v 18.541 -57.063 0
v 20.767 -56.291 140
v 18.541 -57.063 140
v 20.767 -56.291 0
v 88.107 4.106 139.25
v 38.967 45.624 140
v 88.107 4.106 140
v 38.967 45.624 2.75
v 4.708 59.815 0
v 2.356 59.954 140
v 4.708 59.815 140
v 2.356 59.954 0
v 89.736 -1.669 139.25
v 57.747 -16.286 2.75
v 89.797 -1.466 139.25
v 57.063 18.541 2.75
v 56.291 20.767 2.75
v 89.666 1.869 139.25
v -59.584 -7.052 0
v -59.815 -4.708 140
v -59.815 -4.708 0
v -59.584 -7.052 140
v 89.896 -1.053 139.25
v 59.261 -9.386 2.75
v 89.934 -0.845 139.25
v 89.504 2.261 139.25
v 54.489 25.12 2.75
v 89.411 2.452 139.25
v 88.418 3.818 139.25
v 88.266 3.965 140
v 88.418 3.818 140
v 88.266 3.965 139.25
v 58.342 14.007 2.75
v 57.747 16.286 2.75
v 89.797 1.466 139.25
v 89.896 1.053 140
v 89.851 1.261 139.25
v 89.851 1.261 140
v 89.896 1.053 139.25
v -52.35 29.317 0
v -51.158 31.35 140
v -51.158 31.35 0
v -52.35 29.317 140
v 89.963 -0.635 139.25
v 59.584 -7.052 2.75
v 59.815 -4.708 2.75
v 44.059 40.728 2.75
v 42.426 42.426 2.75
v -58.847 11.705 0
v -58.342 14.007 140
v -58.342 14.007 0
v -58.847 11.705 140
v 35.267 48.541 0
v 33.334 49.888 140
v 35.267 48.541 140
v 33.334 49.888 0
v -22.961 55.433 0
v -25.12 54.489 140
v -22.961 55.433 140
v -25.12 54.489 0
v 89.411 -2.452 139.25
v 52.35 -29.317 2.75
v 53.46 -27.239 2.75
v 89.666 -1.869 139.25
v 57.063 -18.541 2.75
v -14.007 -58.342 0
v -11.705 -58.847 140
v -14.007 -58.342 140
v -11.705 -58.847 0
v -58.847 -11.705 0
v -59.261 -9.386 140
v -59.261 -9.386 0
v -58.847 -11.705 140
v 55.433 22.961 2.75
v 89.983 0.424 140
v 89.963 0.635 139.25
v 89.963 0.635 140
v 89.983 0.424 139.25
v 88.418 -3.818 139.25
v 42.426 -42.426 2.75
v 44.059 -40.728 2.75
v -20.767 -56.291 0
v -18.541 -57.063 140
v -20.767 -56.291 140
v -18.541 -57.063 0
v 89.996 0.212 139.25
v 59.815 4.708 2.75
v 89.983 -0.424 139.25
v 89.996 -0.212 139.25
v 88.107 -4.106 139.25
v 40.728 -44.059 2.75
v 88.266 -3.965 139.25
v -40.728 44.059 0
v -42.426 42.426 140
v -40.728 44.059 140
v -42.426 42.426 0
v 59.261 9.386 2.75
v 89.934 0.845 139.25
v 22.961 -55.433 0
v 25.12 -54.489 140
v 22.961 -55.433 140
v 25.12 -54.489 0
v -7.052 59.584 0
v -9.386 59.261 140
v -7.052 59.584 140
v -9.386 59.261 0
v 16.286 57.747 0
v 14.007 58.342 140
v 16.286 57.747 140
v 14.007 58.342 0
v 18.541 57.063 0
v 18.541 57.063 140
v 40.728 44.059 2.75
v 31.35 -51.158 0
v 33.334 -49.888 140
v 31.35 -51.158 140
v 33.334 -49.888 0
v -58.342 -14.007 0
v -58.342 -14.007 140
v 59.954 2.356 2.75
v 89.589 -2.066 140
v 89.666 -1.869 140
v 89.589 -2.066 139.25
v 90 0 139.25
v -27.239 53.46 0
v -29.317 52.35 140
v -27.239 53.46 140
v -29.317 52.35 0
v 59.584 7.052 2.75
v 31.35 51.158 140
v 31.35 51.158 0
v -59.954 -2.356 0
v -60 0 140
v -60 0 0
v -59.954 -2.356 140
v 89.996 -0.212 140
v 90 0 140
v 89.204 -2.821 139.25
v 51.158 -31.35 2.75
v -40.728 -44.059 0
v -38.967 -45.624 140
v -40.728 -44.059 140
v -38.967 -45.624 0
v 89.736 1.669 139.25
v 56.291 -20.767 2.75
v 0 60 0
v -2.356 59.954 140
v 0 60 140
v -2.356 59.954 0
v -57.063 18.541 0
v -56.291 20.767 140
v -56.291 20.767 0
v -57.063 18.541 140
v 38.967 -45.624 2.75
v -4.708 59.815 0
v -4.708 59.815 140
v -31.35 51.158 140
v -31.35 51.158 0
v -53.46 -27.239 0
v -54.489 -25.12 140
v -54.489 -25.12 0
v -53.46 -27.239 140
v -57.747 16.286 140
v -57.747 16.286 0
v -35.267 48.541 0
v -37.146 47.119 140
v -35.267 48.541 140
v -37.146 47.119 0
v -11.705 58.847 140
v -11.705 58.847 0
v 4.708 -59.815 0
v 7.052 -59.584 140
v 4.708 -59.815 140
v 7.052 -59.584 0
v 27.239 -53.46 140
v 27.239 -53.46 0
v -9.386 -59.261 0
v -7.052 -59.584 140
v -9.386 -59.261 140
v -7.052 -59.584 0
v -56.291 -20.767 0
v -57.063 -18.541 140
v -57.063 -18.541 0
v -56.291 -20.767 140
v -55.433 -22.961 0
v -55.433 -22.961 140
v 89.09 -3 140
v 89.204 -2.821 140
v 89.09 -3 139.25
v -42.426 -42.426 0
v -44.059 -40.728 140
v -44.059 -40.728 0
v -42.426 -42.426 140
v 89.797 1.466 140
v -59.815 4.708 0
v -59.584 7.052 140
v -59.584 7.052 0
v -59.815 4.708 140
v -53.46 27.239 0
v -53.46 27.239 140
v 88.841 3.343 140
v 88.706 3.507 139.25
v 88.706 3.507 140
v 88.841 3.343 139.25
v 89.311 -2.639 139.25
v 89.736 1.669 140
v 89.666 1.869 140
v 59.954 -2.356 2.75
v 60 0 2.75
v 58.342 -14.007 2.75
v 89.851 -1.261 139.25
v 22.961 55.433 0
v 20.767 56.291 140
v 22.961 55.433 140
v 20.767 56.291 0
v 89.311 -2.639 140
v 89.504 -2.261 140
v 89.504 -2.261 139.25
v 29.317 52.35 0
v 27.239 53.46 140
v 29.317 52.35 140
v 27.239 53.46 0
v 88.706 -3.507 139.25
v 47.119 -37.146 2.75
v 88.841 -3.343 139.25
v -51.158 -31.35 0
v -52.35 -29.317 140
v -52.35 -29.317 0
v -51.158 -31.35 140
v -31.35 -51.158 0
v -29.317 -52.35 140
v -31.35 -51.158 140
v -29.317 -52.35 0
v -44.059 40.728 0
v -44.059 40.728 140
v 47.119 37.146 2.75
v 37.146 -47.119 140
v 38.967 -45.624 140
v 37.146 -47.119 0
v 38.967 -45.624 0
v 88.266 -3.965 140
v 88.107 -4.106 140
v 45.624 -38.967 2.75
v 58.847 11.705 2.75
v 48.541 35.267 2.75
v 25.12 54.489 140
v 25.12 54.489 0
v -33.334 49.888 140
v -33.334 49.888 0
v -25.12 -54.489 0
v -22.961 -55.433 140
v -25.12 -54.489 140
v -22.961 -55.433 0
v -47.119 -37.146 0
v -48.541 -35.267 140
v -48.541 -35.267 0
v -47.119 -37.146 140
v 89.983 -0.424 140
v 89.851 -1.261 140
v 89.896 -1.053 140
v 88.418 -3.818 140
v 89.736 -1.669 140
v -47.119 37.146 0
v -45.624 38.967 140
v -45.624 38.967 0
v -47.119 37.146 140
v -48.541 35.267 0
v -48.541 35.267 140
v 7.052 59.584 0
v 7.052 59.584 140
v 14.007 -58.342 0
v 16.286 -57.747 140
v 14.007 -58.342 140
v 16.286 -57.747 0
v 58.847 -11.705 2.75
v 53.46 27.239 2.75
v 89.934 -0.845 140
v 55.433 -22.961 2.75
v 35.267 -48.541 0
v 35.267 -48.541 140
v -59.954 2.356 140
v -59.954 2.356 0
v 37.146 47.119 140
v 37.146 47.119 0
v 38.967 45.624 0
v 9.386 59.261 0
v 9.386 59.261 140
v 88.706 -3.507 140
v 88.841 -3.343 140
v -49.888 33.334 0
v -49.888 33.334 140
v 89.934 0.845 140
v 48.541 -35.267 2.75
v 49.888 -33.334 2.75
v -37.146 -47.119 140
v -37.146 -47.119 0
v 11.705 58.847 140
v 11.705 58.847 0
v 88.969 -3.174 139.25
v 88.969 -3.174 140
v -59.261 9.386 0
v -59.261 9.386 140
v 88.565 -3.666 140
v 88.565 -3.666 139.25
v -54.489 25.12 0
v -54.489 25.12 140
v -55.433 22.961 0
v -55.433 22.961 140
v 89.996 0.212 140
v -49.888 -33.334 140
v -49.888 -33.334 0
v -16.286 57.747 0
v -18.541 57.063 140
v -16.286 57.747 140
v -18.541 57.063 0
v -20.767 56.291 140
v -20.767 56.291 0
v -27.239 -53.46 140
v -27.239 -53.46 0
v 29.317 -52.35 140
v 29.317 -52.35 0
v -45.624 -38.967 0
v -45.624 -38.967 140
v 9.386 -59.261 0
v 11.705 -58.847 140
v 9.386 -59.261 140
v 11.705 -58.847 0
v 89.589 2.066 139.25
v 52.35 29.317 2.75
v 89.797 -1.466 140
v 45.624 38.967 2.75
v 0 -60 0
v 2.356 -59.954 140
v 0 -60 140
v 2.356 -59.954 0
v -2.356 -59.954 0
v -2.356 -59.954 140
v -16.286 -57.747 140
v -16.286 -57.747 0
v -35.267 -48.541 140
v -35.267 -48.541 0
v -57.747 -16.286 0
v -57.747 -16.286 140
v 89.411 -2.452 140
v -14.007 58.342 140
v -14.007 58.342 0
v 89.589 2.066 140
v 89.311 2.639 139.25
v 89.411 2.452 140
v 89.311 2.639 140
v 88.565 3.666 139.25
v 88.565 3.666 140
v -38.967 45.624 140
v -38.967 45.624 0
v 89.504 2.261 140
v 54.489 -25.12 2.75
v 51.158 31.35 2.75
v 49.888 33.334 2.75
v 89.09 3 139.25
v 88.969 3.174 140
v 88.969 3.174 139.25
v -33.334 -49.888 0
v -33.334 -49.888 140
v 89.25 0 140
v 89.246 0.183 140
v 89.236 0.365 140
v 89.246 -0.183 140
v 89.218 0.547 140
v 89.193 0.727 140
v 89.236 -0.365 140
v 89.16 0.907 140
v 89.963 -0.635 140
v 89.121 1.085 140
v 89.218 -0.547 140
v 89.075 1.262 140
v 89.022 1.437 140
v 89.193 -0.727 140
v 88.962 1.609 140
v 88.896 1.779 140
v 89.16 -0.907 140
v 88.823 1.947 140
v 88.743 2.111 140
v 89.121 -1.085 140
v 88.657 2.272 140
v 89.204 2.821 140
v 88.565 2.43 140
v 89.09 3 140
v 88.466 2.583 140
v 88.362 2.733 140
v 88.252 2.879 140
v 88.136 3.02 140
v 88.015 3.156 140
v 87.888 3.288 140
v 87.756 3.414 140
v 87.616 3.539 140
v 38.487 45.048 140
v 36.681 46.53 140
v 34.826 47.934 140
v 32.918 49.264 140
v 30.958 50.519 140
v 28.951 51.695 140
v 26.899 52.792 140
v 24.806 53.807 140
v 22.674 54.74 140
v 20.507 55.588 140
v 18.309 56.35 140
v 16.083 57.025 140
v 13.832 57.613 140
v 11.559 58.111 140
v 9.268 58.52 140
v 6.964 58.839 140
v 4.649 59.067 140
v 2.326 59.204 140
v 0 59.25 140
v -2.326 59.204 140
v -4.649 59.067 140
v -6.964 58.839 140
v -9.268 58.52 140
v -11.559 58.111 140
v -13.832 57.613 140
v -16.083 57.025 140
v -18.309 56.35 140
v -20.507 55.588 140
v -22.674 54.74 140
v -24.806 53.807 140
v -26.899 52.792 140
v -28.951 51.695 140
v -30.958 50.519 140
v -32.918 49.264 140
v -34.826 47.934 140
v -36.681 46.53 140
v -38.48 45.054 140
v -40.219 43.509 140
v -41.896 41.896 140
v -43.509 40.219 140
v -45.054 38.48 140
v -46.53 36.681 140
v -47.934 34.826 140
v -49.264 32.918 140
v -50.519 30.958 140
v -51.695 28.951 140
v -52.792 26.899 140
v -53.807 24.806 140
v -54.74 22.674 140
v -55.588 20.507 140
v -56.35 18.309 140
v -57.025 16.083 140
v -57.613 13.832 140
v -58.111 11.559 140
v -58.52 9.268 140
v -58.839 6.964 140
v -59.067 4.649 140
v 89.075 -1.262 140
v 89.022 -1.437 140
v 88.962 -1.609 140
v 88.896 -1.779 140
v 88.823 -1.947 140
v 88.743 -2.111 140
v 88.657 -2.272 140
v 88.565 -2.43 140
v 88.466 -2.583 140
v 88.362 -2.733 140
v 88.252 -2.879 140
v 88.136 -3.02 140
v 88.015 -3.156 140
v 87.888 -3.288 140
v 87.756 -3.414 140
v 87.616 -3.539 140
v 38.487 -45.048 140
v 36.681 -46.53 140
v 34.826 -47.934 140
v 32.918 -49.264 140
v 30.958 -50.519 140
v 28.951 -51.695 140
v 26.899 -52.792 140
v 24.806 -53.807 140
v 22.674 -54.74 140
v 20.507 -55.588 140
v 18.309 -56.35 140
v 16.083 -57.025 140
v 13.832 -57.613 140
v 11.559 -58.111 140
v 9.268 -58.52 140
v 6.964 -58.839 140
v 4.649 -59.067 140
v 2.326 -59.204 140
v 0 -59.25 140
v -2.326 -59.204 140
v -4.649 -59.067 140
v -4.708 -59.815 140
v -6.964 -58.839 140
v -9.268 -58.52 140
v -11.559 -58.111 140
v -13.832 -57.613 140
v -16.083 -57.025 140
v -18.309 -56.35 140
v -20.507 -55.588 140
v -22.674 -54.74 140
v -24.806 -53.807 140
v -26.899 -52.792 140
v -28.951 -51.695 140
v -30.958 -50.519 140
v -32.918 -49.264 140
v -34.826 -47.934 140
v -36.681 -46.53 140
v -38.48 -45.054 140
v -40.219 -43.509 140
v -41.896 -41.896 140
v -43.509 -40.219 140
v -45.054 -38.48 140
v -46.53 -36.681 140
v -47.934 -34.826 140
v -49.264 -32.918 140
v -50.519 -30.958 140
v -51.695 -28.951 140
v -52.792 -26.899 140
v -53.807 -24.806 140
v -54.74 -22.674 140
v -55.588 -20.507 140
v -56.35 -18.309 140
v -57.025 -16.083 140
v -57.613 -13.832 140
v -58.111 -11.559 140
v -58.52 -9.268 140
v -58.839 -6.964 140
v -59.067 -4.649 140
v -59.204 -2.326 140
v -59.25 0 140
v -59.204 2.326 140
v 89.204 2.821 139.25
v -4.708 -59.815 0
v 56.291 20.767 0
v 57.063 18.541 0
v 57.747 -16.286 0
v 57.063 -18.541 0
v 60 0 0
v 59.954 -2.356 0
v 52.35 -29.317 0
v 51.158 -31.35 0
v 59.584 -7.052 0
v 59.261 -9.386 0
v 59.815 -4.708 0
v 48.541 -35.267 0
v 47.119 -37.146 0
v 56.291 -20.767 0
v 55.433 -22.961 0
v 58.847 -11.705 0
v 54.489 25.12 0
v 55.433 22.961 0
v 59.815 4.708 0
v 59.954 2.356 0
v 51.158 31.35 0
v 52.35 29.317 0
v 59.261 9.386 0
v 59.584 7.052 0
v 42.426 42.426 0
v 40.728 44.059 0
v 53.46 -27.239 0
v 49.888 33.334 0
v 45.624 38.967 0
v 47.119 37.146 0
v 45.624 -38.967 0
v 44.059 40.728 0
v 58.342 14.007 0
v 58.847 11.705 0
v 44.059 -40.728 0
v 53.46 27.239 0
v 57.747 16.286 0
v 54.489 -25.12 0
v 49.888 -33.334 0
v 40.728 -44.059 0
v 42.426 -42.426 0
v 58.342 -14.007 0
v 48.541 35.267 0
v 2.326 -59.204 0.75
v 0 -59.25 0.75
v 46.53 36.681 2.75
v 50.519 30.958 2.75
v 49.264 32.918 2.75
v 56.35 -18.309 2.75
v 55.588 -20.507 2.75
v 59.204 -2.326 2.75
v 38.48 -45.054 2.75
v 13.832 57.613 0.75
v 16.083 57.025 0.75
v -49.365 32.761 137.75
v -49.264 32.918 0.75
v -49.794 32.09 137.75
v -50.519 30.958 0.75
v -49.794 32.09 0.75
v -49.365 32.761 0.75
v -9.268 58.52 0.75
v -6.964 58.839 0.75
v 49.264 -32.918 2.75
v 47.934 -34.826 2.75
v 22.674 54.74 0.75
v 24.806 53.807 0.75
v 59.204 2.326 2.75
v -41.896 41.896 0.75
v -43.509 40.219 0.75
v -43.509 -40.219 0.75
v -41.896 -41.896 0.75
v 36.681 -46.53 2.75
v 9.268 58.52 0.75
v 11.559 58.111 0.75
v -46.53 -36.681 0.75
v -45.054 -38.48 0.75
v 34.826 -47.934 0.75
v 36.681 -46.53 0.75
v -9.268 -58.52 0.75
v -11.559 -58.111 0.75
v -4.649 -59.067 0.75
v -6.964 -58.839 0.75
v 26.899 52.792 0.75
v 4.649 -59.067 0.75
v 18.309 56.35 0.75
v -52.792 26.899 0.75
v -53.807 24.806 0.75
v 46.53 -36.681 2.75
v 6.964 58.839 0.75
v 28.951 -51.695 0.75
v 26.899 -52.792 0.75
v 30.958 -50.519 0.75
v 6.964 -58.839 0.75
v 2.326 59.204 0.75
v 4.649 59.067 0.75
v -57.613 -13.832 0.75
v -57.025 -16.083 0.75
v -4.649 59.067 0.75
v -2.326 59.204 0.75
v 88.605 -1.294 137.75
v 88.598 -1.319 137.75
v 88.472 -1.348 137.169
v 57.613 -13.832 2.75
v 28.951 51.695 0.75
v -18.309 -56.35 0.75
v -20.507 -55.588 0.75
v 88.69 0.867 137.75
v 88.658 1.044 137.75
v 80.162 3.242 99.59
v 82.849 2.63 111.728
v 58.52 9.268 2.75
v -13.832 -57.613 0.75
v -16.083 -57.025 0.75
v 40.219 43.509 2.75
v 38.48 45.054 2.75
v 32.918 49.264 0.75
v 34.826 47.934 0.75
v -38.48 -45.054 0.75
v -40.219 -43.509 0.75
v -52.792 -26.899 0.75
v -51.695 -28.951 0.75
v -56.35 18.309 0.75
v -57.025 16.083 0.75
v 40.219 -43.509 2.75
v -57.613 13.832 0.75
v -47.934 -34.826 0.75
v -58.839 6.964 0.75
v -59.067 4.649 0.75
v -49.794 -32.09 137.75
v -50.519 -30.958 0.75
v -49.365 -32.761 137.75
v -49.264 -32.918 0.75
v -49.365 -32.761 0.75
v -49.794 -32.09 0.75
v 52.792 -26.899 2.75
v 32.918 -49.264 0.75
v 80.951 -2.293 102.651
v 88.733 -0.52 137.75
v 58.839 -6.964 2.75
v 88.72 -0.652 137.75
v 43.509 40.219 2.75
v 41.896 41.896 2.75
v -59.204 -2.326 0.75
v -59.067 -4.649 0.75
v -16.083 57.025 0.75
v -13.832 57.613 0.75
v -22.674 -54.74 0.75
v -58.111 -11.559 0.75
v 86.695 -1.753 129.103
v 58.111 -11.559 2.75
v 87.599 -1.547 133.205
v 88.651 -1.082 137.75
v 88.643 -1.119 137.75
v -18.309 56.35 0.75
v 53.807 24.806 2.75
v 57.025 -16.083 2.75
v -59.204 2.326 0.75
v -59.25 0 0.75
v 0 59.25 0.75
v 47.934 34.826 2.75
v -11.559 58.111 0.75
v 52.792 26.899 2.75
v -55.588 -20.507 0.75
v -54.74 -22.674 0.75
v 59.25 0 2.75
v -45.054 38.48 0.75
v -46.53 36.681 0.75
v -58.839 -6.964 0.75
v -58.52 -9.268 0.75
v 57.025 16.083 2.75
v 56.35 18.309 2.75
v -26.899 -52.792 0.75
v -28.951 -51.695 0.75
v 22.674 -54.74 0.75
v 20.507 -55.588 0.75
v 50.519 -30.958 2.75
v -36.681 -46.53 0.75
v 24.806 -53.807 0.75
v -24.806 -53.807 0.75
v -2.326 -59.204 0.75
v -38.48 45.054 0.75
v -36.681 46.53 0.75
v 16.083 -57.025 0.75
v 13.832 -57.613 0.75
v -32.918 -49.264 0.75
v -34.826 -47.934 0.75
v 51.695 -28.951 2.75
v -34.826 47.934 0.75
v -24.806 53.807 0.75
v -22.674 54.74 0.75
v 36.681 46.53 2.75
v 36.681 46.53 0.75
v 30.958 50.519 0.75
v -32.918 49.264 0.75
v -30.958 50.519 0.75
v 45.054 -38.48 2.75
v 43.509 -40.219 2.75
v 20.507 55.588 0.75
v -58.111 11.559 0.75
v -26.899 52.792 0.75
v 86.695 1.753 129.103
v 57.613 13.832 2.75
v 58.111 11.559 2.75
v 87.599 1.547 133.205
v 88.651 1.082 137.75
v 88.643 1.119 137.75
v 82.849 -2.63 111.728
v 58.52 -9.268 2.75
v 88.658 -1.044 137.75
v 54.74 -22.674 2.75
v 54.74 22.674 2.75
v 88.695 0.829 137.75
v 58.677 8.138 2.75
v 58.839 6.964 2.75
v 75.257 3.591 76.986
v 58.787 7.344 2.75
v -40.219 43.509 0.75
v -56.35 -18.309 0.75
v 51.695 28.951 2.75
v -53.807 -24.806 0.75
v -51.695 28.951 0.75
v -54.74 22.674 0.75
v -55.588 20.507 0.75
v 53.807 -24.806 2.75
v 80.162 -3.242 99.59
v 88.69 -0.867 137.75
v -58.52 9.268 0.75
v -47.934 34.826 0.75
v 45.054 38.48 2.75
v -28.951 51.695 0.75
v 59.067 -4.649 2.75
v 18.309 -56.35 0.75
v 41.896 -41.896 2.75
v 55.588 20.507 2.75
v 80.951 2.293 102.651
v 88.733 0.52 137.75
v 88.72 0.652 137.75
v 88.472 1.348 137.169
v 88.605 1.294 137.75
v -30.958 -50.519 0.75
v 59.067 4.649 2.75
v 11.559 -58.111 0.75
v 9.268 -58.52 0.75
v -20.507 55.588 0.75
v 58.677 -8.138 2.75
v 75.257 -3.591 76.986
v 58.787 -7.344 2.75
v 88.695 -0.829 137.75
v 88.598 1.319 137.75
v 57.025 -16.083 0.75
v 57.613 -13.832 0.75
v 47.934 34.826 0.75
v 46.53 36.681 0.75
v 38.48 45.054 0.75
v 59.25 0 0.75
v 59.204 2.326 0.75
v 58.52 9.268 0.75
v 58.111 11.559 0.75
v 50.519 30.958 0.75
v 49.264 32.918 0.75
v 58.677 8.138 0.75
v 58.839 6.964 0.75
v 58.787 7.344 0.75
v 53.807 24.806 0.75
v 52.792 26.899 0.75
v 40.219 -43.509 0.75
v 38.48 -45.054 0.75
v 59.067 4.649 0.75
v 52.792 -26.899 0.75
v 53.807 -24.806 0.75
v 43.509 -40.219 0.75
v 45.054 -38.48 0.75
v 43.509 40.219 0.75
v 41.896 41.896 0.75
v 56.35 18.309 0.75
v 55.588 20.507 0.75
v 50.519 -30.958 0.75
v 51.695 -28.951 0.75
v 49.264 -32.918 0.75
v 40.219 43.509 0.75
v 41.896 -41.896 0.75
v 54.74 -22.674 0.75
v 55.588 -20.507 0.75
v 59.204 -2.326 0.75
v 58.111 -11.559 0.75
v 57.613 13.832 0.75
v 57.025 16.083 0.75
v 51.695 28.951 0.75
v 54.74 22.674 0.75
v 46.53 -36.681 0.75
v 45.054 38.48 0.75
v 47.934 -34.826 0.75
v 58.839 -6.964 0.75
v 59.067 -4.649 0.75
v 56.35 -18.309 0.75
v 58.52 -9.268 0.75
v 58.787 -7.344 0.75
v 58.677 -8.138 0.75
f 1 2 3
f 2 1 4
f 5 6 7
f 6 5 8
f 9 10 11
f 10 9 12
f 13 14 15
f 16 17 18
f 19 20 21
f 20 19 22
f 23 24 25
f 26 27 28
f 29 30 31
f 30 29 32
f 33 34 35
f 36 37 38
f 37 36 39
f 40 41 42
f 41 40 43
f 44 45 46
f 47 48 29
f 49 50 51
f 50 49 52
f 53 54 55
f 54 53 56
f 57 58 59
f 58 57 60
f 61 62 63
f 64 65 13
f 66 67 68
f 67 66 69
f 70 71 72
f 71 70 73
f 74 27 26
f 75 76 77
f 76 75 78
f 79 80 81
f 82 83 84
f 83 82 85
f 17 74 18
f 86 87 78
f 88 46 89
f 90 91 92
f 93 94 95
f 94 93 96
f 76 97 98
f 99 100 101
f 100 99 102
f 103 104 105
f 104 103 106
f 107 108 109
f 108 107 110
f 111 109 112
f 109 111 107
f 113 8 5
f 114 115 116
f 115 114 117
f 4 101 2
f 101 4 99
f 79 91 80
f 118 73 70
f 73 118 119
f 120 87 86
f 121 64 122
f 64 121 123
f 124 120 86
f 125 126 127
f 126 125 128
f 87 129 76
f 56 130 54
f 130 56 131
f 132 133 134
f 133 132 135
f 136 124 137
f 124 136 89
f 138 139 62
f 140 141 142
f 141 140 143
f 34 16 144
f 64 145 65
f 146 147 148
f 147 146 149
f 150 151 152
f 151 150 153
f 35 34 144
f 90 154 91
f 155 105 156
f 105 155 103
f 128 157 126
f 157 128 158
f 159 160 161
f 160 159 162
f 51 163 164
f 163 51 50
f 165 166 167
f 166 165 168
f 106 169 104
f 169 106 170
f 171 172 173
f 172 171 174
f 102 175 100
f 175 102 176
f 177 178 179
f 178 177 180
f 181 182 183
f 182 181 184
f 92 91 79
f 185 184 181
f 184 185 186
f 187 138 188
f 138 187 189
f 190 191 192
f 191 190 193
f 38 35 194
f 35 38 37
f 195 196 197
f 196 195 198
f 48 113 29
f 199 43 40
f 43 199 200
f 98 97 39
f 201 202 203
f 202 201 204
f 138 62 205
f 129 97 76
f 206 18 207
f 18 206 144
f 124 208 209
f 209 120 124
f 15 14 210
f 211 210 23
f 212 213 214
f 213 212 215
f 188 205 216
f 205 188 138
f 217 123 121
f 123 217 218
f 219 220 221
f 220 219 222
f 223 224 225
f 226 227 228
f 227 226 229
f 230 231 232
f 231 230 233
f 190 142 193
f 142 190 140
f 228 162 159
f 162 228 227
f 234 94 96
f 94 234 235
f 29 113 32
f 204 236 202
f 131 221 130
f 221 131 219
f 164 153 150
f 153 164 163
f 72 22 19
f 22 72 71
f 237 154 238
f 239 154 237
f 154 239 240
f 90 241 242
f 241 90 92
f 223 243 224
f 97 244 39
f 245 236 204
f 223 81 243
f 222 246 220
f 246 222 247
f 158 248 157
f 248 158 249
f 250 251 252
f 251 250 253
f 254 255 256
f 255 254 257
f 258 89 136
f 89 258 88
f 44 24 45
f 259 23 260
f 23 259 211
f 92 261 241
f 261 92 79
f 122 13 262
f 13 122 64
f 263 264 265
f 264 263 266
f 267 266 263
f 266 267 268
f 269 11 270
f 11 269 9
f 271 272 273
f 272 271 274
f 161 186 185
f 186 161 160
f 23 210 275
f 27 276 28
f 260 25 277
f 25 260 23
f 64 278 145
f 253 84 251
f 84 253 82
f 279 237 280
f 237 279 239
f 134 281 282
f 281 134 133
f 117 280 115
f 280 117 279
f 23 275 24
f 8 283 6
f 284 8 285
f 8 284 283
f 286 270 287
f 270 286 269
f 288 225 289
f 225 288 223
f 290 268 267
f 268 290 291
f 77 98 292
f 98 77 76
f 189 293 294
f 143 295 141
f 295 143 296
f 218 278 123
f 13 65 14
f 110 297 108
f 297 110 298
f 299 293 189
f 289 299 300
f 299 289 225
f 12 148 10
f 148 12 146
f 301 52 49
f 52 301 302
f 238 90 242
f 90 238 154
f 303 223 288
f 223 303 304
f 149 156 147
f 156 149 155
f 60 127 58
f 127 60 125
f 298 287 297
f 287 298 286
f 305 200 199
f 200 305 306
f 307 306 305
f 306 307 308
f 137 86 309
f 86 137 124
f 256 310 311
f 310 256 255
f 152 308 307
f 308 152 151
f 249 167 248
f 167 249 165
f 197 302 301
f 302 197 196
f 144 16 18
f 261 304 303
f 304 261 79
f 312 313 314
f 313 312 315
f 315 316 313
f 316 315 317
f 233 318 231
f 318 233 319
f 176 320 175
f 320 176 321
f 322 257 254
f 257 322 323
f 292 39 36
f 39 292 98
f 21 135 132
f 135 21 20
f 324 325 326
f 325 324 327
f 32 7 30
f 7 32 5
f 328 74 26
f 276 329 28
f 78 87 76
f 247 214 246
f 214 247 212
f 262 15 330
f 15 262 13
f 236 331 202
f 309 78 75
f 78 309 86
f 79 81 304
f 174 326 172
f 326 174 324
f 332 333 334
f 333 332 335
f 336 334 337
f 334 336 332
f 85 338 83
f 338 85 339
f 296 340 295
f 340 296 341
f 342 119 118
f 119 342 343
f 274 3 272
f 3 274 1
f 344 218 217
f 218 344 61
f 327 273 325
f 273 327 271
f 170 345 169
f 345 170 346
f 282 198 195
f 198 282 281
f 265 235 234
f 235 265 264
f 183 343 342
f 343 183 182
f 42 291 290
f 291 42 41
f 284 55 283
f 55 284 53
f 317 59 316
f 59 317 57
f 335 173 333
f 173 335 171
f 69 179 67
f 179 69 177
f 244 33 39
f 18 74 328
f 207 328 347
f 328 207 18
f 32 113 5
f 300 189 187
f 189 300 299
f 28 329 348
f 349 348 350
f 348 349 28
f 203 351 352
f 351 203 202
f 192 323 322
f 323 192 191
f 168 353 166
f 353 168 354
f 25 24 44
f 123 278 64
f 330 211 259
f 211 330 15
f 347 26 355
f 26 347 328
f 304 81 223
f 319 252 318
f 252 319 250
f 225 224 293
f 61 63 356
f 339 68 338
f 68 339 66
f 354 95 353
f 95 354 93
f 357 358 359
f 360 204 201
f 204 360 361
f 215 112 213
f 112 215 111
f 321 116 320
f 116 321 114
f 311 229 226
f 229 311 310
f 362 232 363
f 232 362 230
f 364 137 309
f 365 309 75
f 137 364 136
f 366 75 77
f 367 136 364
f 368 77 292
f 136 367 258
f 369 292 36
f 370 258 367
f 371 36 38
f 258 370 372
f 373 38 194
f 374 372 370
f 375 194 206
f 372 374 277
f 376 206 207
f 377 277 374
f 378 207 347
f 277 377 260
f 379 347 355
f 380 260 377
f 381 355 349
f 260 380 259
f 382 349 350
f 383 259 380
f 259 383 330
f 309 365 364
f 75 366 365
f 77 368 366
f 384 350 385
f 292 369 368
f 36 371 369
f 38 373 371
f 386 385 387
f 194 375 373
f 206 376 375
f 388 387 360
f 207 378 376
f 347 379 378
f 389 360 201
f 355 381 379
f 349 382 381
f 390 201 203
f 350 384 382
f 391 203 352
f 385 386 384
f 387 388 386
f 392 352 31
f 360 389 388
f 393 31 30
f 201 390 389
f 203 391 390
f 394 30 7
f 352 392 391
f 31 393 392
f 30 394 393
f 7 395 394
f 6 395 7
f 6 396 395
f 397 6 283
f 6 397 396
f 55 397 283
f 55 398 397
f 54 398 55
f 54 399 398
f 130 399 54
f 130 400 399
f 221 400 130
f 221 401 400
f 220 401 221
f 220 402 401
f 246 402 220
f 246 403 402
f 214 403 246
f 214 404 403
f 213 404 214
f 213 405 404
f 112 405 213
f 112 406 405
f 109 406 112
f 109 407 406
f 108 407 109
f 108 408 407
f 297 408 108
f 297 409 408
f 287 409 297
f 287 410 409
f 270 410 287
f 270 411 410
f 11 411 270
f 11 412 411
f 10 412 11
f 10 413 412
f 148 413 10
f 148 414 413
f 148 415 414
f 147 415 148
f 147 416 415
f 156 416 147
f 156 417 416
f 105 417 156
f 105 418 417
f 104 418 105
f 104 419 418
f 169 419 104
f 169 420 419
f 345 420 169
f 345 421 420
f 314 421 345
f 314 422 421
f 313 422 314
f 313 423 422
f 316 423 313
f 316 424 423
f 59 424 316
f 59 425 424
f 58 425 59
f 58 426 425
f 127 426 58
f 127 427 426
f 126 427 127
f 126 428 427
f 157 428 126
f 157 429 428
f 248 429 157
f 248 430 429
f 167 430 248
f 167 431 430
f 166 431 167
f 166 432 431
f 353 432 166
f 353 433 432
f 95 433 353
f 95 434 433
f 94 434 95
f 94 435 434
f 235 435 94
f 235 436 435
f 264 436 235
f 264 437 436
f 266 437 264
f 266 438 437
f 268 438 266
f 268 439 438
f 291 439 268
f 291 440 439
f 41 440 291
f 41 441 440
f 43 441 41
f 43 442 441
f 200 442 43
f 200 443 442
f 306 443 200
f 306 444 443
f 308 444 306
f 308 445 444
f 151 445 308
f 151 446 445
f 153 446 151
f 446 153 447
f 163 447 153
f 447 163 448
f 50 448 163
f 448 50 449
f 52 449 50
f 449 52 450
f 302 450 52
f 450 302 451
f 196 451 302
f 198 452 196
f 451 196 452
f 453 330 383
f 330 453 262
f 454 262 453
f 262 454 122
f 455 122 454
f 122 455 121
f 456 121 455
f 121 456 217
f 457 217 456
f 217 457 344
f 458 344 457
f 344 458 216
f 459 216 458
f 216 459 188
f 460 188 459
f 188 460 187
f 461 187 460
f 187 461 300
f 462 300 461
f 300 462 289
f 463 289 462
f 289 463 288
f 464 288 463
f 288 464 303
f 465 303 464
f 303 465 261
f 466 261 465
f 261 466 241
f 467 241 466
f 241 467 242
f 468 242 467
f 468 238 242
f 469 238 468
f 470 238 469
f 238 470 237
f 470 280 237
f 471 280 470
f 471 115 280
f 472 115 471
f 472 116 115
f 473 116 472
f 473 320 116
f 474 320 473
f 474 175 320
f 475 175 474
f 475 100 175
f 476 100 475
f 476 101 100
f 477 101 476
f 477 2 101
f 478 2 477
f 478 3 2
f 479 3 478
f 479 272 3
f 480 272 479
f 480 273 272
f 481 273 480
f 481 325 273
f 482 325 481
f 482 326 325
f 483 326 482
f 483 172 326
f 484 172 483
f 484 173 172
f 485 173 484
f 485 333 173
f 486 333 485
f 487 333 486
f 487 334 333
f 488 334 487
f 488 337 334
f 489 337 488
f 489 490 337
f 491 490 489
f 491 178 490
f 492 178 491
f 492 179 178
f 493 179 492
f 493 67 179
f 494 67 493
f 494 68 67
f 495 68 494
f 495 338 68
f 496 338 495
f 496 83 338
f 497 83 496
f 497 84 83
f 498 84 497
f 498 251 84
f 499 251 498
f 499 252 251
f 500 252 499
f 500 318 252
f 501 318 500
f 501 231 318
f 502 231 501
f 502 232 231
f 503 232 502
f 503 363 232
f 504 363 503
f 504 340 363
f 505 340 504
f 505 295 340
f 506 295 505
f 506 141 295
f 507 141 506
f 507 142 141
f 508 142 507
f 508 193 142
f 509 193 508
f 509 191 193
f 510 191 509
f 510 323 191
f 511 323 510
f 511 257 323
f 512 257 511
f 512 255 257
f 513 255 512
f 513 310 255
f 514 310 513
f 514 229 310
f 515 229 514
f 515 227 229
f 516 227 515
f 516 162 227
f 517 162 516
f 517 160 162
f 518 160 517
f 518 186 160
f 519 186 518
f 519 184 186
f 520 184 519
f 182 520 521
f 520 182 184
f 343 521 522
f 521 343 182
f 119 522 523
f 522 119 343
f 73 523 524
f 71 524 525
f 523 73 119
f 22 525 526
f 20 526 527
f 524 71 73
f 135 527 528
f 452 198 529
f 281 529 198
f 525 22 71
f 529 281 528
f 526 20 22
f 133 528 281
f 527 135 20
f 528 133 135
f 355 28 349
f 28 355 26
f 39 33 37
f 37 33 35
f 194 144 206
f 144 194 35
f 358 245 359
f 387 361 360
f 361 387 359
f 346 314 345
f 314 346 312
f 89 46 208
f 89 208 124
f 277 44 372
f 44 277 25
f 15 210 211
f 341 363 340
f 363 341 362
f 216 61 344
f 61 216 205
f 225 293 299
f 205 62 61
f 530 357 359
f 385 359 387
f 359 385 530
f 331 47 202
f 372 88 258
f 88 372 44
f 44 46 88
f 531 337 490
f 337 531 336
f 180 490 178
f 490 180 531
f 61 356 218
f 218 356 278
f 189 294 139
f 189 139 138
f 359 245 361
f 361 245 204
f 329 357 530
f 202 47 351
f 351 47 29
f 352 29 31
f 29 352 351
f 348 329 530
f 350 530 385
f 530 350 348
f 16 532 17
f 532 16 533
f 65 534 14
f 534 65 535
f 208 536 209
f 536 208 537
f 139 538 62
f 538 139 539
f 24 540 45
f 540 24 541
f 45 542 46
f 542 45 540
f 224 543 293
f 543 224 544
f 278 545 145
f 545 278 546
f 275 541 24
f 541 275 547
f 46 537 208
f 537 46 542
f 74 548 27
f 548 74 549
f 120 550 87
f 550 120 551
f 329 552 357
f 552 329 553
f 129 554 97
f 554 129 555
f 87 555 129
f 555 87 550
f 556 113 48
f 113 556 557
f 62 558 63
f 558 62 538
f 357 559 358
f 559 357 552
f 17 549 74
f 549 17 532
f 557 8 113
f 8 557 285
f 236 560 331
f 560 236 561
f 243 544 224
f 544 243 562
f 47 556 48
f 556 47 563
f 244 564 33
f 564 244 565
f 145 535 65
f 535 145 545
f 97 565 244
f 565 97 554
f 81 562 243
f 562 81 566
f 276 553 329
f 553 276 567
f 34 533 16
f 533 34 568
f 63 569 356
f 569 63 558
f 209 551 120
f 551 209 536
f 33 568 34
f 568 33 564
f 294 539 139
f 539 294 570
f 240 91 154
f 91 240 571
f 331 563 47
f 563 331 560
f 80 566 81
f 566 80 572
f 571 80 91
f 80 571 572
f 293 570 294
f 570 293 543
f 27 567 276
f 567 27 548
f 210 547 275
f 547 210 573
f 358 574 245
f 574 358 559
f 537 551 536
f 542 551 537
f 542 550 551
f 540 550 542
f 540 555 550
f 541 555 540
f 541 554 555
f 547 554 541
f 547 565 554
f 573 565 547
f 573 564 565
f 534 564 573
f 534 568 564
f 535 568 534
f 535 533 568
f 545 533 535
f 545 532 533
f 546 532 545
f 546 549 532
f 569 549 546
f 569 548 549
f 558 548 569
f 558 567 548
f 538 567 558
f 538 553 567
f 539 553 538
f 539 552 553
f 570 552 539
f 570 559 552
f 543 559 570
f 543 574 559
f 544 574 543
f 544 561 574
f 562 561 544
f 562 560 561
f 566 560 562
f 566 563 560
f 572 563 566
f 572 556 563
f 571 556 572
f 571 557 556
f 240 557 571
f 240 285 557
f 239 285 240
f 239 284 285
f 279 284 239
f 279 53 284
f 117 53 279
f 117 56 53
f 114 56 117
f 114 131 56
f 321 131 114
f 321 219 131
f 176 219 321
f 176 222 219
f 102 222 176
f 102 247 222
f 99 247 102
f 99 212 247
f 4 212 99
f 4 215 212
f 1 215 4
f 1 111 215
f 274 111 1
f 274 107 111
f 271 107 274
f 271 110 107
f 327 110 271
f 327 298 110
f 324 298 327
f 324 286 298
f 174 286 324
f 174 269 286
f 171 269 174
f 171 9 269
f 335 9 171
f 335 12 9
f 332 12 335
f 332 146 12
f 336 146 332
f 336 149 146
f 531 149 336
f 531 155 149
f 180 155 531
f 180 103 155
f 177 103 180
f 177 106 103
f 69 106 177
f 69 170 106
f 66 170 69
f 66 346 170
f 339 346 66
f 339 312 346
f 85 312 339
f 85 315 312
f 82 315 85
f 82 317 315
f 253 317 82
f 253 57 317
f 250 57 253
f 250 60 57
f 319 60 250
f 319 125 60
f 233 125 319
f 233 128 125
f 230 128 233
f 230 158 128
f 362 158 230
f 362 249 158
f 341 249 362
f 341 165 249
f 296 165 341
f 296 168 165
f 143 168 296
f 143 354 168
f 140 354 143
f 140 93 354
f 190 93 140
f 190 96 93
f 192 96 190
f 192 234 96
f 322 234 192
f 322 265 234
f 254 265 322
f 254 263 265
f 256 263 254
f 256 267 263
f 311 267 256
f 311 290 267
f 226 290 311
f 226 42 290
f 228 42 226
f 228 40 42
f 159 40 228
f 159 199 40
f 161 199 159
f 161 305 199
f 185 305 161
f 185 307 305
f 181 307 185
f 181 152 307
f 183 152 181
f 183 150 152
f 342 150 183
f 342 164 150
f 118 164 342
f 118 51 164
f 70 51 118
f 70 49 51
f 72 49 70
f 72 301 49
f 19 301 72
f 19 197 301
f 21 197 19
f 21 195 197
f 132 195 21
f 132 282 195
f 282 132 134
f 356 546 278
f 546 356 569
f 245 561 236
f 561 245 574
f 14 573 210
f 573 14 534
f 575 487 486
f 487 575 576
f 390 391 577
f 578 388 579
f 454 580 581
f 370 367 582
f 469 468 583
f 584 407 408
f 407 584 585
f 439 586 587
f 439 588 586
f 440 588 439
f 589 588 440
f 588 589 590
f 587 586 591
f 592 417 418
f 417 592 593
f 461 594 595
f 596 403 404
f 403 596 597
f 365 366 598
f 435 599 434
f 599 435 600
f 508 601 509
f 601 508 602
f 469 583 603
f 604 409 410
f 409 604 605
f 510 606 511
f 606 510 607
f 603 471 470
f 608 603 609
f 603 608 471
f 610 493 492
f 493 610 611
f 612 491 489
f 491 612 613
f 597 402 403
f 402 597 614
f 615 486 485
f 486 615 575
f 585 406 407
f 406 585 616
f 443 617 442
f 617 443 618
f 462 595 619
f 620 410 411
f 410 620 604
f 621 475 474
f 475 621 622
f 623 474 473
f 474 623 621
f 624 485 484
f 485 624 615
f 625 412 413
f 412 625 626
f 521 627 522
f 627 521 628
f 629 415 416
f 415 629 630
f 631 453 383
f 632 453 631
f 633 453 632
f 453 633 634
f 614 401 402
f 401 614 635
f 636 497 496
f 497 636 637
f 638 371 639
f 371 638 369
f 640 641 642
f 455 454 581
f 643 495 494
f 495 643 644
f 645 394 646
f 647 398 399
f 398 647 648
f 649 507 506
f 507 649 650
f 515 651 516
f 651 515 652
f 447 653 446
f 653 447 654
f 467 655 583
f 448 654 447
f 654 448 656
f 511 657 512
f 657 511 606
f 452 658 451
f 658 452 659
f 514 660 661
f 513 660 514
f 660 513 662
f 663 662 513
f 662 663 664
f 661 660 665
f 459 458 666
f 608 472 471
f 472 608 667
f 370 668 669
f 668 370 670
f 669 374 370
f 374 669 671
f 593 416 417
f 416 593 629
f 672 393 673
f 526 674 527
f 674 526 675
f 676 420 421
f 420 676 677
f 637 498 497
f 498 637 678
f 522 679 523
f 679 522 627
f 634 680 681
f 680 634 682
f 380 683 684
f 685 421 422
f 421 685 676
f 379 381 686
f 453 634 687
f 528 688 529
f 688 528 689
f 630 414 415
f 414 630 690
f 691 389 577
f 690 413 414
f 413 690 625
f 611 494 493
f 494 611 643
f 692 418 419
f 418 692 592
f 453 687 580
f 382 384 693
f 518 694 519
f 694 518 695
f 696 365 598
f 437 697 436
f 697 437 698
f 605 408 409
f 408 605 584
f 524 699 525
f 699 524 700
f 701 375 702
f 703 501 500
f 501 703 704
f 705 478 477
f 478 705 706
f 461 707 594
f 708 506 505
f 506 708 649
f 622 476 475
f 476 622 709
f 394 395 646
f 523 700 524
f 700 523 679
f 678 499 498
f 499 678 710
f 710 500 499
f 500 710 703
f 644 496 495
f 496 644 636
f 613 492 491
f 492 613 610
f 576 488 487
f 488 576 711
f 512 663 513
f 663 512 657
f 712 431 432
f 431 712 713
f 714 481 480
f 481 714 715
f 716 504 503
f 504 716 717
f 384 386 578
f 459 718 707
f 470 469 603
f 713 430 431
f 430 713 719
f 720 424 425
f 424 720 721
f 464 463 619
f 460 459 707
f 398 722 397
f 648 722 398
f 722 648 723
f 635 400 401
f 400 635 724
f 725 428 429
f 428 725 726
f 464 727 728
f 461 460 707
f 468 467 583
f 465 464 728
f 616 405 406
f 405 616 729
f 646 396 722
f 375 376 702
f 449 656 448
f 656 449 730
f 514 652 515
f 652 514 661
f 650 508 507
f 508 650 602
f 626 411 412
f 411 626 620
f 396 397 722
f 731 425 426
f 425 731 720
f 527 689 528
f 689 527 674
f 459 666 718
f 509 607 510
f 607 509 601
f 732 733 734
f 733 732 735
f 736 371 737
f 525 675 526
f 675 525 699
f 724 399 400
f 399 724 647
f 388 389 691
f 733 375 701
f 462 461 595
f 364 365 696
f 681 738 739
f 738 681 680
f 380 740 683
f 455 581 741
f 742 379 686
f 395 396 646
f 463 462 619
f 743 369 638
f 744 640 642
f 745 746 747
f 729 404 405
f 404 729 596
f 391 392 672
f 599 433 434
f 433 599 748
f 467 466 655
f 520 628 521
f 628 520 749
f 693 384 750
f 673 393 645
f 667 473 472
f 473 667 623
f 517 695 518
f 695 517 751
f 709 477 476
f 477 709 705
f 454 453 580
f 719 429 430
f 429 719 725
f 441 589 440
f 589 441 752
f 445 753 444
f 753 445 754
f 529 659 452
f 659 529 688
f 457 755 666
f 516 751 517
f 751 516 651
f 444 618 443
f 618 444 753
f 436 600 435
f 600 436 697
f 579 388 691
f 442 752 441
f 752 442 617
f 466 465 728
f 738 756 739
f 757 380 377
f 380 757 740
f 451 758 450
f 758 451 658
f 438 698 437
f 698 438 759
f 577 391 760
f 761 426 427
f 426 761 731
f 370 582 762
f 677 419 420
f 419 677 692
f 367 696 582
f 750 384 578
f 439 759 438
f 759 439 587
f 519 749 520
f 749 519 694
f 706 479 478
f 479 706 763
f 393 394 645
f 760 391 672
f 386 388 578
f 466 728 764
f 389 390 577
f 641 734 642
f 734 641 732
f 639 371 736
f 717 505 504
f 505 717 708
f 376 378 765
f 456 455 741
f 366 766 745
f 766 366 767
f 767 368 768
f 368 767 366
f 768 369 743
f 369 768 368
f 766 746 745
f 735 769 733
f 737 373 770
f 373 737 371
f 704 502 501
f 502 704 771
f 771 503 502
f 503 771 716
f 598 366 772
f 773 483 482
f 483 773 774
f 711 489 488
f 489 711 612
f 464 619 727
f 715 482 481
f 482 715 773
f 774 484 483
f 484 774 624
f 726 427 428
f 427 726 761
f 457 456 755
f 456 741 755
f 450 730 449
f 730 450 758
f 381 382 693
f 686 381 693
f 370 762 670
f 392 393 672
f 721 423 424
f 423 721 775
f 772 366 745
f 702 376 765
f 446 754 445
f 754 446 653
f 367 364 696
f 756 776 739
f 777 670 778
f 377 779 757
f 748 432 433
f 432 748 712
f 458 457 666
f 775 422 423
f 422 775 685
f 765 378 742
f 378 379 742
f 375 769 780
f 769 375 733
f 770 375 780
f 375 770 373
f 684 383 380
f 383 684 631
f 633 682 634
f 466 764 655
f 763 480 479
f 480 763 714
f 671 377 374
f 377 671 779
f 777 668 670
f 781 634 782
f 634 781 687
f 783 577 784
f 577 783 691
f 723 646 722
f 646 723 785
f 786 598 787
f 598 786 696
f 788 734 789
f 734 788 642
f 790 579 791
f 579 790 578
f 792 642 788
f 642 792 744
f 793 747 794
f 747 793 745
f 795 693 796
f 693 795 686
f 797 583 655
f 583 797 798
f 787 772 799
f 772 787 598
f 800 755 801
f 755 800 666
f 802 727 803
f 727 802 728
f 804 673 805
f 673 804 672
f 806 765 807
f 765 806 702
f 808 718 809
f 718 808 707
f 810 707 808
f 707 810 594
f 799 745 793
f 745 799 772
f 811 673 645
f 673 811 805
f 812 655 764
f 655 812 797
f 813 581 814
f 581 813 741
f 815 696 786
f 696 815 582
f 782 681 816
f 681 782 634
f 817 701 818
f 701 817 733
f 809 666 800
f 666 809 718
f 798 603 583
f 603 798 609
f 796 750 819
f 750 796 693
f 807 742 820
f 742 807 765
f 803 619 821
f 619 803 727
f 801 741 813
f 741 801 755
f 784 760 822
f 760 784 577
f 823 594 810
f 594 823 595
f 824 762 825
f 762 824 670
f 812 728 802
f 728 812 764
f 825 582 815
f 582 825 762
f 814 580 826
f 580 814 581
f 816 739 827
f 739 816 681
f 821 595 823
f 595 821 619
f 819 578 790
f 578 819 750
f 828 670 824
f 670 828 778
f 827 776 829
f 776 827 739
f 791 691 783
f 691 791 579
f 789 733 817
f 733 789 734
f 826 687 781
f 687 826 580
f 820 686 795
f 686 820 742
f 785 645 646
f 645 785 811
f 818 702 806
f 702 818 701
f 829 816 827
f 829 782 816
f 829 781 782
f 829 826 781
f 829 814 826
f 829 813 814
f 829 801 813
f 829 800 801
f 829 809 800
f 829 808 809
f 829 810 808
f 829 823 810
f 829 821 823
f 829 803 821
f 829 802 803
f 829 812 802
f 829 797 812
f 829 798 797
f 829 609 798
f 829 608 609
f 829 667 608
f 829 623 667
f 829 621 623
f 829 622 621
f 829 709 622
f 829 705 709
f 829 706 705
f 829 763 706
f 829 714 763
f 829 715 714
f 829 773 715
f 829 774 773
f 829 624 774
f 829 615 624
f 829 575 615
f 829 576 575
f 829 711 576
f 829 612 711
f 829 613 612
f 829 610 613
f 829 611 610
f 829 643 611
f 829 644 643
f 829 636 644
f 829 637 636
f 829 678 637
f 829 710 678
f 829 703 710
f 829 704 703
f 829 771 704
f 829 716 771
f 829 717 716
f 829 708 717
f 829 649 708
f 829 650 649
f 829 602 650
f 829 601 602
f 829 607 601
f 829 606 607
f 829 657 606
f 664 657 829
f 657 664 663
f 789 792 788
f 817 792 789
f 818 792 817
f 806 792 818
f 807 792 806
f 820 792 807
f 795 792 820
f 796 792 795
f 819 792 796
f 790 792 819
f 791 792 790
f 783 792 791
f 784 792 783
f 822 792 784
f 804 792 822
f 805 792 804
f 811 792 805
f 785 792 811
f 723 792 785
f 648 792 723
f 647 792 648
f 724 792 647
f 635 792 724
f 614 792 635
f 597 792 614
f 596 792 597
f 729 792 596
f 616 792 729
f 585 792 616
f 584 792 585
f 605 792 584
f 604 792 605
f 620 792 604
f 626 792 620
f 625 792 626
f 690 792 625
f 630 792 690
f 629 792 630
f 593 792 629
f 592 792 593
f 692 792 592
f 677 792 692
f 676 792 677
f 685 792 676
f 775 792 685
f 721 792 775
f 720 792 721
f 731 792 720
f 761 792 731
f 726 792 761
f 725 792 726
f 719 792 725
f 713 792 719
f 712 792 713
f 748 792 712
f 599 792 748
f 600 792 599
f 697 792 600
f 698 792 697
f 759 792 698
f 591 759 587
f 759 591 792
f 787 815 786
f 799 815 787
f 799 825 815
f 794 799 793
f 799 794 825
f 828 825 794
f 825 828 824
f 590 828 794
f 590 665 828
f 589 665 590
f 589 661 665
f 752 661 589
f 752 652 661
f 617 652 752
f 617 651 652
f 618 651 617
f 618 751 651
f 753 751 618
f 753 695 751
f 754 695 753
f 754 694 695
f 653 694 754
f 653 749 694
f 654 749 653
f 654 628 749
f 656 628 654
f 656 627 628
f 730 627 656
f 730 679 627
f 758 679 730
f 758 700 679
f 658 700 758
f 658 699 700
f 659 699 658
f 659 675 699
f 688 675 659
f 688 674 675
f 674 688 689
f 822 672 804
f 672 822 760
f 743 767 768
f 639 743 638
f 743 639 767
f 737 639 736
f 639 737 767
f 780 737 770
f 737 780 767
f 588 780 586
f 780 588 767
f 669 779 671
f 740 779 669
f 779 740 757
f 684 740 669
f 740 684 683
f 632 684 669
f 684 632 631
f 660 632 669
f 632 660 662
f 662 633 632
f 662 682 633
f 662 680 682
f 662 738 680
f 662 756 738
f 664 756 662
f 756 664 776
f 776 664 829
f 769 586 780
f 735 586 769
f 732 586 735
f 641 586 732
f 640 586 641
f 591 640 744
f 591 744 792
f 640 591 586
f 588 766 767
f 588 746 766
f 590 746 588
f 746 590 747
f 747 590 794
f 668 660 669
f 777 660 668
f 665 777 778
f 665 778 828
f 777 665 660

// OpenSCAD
$fn=160;
h=140;
pip=.975;
pipr=.09;
dia=120;
div=3;
wall=0.75;

  l=0.87;
difference()
{

 connect(){
translate([0,0,h-wall])linear_extrude(wall)top();
translate([0,0,h*(1-pip)-wall])linear_extrude(wall)bottom();
linear_extrude(wall)bottom();
 }
 
difference(){
 connect(){
translate([0,0,h])linear_extrude(wall)offset(-wall)top();
translate([0,0,h*(1-pip)-wall])linear_extrude(wall)offset(-wall)bottom();
translate([0,0,wall]) linear_extrude(wall)offset(-wall)bottom();
 }
linear_extrude(h-wall*3,convexity=100) {

 for (x=[dia/(div
     )*(div%2):dia/(div/2
     ):dia/1.5]){
 hull()
 {
     translate([((-dia/2)),x*l,0]) 
  circle(wall/2);
 
translate([((dia/2)*1.5)-((dia/2)*pipr)*-.5,0,0])  circle(wall/2);
 }
  hull()
 {
     translate([((-dia/2)),-x*l,0]) 
  circle(wall/2);
 
translate([((dia/2)*1.5)-((dia/2)*pipr)*-.5,0,0])  circle(wall/2);
 }
 }}
}

} 

module connect()
{
  hull(){
      children(0);
    children(1);
  }
  hull(){
    children(1);
    children(2);
  }
    }




module bottom()
    {
        circle(dia/2);
        
        }

module top(){
    
 hull(){ 
    bottom();
    translate([((dia/2)*1.5)-((dia/2)*pipr),0,0])circle((dia/2)*pipr);
   }
    }
